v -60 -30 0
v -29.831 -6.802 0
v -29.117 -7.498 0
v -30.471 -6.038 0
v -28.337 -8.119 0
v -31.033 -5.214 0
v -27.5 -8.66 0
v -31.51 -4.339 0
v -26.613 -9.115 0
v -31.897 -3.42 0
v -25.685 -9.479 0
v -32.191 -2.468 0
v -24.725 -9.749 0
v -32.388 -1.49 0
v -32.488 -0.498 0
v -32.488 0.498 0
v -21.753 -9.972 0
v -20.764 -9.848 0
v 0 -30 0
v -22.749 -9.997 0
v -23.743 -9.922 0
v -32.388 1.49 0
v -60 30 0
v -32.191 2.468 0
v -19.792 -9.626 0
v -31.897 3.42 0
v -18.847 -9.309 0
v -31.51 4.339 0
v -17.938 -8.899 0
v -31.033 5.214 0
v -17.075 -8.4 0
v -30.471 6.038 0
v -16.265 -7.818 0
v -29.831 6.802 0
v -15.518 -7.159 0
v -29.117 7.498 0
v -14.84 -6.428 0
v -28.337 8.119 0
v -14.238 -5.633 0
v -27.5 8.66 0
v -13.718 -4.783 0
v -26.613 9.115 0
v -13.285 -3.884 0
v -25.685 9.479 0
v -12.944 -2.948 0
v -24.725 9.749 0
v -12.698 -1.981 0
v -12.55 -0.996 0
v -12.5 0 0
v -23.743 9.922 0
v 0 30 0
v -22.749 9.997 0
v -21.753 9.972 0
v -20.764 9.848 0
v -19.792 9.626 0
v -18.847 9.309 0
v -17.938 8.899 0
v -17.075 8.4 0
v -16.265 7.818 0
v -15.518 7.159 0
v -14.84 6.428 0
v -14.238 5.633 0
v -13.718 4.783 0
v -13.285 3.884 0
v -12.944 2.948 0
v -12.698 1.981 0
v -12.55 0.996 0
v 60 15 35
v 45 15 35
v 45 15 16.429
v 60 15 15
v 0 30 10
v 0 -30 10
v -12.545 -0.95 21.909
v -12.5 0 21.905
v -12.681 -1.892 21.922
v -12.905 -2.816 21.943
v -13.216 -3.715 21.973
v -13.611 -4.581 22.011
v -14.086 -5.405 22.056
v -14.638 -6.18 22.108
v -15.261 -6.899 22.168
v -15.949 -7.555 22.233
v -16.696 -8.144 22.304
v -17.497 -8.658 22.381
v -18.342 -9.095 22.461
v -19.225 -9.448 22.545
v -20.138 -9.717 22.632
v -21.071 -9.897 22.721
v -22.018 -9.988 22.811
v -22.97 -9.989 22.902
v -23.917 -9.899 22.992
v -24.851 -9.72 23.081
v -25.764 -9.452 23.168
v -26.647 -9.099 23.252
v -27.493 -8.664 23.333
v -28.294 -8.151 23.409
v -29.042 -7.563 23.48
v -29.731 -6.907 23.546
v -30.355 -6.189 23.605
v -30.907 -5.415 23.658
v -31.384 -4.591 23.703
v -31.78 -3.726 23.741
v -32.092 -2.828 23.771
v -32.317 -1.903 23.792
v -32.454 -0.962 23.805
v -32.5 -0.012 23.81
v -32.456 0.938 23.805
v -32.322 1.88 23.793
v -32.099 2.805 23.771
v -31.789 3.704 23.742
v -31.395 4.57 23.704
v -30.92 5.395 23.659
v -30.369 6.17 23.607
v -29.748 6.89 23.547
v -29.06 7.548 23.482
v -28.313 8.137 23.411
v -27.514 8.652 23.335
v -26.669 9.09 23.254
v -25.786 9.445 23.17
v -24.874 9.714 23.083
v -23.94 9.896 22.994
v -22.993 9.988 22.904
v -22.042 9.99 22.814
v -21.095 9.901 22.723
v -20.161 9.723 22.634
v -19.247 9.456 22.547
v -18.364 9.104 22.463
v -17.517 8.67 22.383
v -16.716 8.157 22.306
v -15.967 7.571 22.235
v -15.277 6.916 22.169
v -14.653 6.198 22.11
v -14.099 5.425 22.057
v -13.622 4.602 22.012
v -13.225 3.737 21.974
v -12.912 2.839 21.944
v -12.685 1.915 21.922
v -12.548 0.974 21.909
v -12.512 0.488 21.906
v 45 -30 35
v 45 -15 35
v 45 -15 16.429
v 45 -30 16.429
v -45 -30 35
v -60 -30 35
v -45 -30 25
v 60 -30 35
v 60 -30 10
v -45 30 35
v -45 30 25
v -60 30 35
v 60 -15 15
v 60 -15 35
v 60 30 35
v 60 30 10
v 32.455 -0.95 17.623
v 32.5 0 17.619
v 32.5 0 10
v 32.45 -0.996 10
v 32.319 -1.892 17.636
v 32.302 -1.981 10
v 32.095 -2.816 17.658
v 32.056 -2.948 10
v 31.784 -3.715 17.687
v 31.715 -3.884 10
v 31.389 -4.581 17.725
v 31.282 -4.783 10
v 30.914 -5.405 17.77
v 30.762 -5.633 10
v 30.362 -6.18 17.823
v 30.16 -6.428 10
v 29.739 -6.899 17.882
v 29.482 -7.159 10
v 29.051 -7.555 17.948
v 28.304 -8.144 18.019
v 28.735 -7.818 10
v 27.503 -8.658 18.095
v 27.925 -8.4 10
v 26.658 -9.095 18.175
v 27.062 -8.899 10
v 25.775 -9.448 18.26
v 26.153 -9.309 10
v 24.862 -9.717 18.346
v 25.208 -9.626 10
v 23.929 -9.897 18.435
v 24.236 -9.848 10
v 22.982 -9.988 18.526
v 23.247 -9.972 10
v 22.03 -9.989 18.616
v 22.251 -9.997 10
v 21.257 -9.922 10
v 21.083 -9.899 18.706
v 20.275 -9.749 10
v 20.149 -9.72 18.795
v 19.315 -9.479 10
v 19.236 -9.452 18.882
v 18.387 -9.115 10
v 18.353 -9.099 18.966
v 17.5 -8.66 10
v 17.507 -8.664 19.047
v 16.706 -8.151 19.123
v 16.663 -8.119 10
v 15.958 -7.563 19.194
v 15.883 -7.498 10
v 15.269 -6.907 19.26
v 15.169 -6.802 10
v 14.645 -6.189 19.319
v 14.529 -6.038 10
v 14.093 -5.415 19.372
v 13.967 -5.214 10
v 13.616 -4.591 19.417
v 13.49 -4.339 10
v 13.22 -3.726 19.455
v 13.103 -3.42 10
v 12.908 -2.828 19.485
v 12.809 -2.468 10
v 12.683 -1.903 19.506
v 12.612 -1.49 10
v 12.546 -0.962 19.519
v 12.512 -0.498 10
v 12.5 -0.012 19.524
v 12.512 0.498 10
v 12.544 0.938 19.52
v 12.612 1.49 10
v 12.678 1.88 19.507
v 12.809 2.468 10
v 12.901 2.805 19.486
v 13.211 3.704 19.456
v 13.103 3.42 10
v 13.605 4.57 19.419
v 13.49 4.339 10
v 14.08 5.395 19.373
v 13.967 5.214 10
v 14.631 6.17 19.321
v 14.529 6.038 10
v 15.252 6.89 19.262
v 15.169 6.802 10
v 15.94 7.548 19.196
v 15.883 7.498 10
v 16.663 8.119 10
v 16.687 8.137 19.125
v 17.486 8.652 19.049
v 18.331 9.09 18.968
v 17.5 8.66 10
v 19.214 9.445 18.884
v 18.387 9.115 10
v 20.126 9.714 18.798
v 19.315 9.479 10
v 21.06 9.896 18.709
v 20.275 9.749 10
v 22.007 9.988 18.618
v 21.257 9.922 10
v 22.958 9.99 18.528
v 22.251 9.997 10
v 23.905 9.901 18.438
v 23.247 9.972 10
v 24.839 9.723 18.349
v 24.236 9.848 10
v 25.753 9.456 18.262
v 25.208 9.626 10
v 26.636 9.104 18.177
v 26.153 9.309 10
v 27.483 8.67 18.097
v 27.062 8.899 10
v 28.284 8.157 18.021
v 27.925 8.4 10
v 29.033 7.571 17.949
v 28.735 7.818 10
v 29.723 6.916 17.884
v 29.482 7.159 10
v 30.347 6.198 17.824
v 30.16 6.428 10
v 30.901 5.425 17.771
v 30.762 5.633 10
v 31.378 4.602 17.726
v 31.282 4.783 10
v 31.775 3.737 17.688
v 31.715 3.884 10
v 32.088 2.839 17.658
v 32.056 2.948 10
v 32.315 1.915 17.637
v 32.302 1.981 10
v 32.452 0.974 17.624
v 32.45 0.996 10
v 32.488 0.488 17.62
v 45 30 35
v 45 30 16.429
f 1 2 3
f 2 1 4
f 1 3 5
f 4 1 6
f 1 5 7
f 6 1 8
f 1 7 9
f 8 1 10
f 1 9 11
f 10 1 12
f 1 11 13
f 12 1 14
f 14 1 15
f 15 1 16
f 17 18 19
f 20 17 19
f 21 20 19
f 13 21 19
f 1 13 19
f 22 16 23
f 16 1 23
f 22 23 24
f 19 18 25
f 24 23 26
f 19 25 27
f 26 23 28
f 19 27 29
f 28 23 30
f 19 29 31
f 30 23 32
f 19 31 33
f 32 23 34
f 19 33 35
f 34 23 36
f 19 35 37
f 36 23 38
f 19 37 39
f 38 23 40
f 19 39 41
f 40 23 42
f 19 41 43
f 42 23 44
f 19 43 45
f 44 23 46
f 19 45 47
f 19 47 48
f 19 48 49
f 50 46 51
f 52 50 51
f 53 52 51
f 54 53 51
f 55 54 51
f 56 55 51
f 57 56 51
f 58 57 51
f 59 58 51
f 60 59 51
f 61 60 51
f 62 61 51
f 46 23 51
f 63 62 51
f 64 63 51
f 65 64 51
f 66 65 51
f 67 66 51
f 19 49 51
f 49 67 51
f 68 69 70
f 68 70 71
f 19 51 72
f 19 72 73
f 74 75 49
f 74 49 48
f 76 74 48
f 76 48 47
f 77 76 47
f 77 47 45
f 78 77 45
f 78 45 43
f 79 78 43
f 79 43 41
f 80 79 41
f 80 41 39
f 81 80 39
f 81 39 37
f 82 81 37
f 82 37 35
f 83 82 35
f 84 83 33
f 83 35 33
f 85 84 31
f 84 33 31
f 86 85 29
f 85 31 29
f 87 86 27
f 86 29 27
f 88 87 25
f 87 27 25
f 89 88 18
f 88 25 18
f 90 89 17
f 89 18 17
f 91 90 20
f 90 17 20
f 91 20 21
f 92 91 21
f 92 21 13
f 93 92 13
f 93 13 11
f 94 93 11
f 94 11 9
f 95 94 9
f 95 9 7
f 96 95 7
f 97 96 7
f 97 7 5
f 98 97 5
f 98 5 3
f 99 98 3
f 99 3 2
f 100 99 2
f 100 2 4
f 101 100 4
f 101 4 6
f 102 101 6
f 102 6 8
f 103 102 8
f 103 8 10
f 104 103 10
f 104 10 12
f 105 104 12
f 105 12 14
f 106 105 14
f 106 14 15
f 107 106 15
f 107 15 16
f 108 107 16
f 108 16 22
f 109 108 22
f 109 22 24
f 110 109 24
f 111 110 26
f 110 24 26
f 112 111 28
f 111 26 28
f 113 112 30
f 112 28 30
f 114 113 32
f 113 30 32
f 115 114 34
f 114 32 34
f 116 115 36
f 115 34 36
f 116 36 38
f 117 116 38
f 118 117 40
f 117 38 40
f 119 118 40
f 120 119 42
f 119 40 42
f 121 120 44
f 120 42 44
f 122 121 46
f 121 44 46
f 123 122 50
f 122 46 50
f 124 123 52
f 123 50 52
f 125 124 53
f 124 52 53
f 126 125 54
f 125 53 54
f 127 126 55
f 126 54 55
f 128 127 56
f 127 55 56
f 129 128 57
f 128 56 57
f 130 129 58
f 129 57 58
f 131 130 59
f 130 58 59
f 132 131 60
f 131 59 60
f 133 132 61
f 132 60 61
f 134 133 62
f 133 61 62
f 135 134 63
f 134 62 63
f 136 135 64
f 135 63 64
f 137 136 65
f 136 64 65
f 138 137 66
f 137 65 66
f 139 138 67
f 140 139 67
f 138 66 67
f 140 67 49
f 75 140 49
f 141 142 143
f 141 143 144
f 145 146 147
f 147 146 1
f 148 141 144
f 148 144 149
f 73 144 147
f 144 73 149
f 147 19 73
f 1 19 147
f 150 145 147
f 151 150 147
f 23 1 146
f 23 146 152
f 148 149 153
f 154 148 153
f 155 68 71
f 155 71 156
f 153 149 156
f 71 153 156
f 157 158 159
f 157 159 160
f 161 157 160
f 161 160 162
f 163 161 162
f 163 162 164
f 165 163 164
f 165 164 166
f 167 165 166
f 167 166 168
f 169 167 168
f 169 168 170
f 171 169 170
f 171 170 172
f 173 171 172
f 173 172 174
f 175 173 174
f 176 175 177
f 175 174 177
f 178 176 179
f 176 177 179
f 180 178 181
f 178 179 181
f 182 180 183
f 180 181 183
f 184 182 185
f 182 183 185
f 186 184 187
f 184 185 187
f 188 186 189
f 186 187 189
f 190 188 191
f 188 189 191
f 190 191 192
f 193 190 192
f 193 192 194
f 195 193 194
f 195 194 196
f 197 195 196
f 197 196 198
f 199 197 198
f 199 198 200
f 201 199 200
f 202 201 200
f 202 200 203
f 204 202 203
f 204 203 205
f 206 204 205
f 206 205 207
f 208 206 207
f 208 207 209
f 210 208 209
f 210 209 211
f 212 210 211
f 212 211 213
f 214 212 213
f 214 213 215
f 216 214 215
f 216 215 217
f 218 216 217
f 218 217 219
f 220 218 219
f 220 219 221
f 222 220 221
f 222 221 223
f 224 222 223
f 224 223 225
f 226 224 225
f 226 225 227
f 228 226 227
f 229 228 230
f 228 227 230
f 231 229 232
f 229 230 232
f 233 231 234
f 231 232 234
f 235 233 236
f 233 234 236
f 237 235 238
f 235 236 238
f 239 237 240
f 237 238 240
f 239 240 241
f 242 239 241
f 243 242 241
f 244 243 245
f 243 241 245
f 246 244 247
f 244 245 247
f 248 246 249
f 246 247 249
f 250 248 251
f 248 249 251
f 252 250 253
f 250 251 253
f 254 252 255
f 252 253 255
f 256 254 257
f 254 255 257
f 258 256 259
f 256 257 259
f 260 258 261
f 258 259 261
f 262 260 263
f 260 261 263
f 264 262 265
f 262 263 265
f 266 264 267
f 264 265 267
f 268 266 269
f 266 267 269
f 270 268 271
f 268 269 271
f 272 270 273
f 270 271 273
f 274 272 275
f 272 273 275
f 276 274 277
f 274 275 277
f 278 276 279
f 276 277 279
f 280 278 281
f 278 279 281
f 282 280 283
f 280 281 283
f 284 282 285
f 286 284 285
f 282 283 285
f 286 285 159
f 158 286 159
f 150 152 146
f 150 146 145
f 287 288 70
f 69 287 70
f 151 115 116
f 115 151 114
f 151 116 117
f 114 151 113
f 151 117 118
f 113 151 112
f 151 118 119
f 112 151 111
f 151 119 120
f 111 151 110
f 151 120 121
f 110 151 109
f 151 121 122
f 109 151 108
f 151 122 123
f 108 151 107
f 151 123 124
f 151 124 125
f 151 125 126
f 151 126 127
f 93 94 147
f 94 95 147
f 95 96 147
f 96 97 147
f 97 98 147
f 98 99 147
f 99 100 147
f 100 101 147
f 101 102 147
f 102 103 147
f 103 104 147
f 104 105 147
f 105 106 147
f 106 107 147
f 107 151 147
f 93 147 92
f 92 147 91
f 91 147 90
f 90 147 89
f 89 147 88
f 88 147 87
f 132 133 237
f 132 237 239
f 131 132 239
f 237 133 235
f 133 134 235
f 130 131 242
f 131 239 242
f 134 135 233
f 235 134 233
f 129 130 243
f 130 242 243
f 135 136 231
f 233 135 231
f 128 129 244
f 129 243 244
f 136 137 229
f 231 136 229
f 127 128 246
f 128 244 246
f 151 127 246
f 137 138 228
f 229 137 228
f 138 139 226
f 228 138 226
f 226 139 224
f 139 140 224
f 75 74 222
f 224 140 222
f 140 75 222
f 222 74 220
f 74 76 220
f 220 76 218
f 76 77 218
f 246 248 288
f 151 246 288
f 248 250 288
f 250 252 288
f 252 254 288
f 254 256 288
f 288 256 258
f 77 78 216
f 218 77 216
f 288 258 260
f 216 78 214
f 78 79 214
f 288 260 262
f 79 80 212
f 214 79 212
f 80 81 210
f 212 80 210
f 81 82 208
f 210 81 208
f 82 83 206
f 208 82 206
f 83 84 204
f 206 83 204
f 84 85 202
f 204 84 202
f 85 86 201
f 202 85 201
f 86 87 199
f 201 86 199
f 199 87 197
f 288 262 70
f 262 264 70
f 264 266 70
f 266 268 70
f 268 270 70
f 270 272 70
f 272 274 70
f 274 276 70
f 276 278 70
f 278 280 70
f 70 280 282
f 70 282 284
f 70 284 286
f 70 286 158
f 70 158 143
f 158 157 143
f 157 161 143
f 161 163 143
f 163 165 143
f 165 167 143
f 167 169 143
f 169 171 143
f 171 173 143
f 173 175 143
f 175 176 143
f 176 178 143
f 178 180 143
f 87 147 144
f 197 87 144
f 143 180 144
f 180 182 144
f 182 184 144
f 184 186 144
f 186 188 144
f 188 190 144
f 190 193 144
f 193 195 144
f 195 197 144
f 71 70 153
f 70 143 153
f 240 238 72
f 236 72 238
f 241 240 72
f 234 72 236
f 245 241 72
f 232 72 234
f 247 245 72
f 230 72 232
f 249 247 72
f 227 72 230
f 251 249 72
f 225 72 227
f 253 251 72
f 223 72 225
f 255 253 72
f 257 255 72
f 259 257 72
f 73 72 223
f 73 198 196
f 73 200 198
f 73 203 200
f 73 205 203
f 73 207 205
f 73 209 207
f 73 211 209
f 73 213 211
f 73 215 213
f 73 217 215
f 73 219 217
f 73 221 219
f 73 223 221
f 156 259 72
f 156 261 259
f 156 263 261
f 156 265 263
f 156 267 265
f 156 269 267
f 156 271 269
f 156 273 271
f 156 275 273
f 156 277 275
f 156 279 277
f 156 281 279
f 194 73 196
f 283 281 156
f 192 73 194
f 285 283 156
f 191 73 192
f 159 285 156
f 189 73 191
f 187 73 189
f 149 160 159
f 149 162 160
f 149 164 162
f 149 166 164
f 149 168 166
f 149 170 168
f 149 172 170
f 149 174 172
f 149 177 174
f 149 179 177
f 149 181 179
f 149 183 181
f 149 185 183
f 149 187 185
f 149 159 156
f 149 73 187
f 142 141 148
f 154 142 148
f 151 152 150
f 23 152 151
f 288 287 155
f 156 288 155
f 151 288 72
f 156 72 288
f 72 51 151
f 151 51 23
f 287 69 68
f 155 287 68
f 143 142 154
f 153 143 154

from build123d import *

# Parameters (mm, degrees)
SKETCH_W        = 120
SKETCH_H        = 60
PAD_DEPTH       = 35
POCKET_DEPTH    = 60.001
SKETCH002_W     = 15
SKETCH002_H     = 15
PAD001_DEPTH    = 35
SKETCH003_R     = 10
POCKET001_DEPTH = 35.001
SKETCH004_W     = 60
SKETCH004_H     = 60
POCKET002_DEPTH = 10


with BuildPart() as part:
    # Sketch → Pad (new body)
    with BuildSketch(Plane.XY):
        Rectangle(SKETCH_W, SKETCH_H)
    extrude(amount=PAD_DEPTH)

    # Sketch001 → Pocket (cut, through all)
    with BuildSketch(Plane.XZ.offset(30)):
        Polygon((-45, 35), (-45, 25), (60, 15), (60, 35), align=None)
    extrude(amount=-POCKET_DEPTH, mode=Mode.SUBTRACT)

    # Sketch002 → Pad001 (new body)
    with BuildSketch(Plane(origin=(0, 0, 0), x_dir=(1, 0, 0), z_dir=(0, 0, -1))):
        with Locations((52.5, 22.5)):
            Rectangle(SKETCH002_W, SKETCH002_H)
        with Locations((52.5, -22.5)):
            Rectangle(SKETCH002_W, SKETCH002_H)
    extrude(amount=-PAD001_DEPTH)

    # Sketch003 → Pocket001 (cut, through all)
    with BuildSketch(Plane(origin=(0, 0, 0), x_dir=(1, 0, 0), z_dir=(0, 0, -1))):
        with Locations((-22.5, 0)):
            Circle(SKETCH003_R)
        with Locations((22.5, 0)):
            Circle(SKETCH003_R)
    extrude(amount=-POCKET001_DEPTH, mode=Mode.SUBTRACT)

    # Sketch004 → Pocket002 (cut)
    with BuildSketch(Plane(origin=(0, 0, 0), x_dir=(1, 0, 0), z_dir=(0, 0, -1))):
        with Locations((30, 0)):
            Rectangle(SKETCH004_W, SKETCH004_H)
    extrude(amount=-POCKET002_DEPTH, mode=Mode.SUBTRACT)


solid = part.part
